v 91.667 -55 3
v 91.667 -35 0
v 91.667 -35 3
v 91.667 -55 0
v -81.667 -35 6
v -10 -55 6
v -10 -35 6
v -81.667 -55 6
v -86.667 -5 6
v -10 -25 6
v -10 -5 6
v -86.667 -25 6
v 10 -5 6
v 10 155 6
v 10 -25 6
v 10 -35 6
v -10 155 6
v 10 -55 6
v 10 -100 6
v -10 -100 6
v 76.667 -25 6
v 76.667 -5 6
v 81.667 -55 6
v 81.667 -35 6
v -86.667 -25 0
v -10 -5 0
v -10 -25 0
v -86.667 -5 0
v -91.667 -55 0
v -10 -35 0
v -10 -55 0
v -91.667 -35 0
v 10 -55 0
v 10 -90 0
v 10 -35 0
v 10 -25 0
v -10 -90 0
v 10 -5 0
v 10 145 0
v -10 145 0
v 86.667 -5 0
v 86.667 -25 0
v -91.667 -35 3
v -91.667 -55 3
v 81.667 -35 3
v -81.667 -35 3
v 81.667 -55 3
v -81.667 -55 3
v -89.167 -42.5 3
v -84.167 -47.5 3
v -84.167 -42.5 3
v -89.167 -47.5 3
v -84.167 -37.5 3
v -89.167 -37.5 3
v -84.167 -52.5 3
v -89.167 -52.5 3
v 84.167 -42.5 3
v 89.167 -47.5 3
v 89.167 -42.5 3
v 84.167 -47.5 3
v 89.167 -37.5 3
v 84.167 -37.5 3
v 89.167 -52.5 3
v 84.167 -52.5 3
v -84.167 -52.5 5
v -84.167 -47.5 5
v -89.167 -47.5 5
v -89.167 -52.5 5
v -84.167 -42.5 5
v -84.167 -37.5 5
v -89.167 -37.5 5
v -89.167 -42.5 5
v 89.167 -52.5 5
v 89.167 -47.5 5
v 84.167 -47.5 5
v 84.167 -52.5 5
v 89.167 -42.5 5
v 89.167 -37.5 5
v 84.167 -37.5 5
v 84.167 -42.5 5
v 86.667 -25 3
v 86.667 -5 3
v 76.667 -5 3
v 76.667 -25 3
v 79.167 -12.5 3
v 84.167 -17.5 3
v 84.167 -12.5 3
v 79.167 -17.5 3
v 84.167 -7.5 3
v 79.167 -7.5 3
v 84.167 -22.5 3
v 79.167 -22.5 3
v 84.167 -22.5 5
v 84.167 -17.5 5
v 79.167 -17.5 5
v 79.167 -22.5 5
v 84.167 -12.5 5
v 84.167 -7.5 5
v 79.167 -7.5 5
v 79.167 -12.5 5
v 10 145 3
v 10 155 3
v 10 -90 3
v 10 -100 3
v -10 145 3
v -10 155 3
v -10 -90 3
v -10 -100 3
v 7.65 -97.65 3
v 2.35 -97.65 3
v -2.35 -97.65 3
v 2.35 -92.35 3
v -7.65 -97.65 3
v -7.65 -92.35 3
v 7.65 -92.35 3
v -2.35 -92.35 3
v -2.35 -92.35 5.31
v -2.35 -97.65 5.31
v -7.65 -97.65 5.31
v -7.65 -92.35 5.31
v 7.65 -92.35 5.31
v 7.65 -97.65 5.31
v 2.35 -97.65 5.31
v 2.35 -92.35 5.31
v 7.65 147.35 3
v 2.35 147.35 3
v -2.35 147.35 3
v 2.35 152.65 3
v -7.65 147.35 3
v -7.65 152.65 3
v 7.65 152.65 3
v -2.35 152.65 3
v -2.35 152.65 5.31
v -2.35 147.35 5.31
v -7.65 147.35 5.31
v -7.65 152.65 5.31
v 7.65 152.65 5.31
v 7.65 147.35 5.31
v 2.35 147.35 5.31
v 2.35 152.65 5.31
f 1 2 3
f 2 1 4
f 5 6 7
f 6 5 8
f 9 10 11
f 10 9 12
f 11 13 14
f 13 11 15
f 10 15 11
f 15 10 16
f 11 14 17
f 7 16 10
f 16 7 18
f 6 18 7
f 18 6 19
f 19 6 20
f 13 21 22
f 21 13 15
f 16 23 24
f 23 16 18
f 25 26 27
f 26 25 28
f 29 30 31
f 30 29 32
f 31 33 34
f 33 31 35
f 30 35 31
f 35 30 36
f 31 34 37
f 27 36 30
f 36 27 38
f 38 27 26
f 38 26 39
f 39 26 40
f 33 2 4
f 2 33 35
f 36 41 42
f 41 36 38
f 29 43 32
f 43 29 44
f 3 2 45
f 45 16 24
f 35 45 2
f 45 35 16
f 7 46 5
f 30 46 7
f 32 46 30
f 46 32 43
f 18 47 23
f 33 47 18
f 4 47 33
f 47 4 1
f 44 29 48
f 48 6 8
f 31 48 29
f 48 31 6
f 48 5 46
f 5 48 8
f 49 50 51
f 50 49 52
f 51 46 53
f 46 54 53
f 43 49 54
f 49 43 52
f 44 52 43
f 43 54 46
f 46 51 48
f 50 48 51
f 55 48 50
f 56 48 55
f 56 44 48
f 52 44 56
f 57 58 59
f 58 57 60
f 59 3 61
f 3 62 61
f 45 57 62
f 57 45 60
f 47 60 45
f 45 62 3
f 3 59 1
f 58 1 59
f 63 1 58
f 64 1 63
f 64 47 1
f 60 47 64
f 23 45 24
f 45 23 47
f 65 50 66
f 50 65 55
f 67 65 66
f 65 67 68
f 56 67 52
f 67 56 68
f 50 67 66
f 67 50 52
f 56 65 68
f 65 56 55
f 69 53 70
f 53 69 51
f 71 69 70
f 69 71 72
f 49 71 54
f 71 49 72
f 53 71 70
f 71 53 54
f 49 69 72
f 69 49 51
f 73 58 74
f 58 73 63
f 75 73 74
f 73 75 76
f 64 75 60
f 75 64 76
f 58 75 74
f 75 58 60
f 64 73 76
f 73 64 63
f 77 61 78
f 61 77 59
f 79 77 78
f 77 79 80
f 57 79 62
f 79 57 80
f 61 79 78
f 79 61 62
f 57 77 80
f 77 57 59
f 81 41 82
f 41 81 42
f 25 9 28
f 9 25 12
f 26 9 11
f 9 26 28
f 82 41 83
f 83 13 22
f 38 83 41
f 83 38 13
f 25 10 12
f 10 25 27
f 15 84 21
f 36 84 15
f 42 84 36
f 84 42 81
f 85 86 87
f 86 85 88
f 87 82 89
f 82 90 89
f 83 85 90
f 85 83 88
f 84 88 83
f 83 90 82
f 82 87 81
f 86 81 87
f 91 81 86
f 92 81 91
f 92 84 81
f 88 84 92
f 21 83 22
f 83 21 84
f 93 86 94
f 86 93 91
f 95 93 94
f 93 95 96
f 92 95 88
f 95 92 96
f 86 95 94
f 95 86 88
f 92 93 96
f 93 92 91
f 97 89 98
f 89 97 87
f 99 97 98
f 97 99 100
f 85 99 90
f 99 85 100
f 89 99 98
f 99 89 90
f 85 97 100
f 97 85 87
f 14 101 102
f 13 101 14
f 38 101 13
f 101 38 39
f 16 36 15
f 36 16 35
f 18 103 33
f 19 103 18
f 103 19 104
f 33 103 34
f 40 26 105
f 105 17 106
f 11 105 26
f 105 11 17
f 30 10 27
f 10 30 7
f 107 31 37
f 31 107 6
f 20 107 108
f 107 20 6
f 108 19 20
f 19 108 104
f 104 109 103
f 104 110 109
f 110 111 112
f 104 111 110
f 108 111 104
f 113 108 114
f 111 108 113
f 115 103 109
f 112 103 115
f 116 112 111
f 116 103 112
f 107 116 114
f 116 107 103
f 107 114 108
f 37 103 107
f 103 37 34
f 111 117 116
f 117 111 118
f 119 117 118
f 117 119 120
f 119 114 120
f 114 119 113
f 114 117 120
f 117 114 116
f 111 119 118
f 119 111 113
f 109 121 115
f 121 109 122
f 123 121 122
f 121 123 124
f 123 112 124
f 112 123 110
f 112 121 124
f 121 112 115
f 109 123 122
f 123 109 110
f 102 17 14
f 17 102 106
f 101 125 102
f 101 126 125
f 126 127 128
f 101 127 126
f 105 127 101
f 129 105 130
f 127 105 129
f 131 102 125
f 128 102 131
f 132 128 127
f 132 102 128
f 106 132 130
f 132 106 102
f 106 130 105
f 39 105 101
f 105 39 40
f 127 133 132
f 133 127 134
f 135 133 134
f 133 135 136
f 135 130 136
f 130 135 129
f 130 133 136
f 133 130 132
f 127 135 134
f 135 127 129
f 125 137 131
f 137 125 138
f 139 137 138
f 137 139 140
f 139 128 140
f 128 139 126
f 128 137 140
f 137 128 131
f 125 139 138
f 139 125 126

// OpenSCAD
/**
 * Muntin Bar Generator — 3D Printed Door Grid
 * Parametric model for MakerWorld
 *
 * Companion calculator: https://emorin310.github.io/muntin-calculator/
 *
 * Pieces interlock at 4-way intersections via half-lap joints
 * with puzzle tabs for positive Z-locking.
 * H bars keep the bottom half at connectors (tabs protrude up).
 * V bars keep the top half at connectors (slots receive tabs).
 */

/* [Window] */
// Width of glass pane (mm)
pane_width = 530;
// Height of glass pane (mm)
pane_height = 1590;

/* [Bar] */
// Width of bars at intersections (mm)
bar_width = 20;
// Thickness of bars (mm)
bar_thickness = 6;

/* [Printer] */
// Maximum print bed length (mm)
max_bed = 250;

/* [Connector] */
// Puzzle tab width (mm)
tab_w = 5;
// Puzzle tab length along bar (mm)
tab_l = 5;
// Puzzle tab height / depth (mm)
tab_h = 2;
// Print clearance for slot fit (mm)
clearance = 0.3;

/* [Piece Selection] */
// Which piece to generate
piece = "all"; // [all:All Types, h_center:Horizontal Center, h_edge:Horizontal Edge, v_center:Vertical Center, v_edge:Vertical Edge]

/* [Hidden] */

// --- Auto-calculate minimum bars to fit print bed ---
max_flat = max_bed - bar_width;

v_bars = max(1, ceil((pane_width - max_flat) / (max_flat + bar_width)));
h_bars = max(1, ceil((pane_height - max_flat) / (max_flat + bar_width)));

// Flat lengths between intersections
h_flat = (pane_width - v_bars * bar_width) / (v_bars + 1);
v_flat = (pane_height - h_bars * bar_width) / (h_bars + 1);

// Piece total lengths
h_center_len = h_flat + bar_width;      // connector both ends
h_edge_len   = h_flat + bar_width / 2;  // connector one end
v_center_len = v_flat + bar_width;
v_edge_len   = v_flat + bar_width / 2;

// Piece counts
cols = v_bars + 1;
rows = h_bars + 1;
n_h_edge   = h_bars * 2;
n_h_center = h_bars * max(0, v_bars - 1);
n_v_edge   = v_bars * 2;
n_v_center = v_bars * max(0, h_bars - 1);
n_total    = n_h_edge + n_h_center + n_v_edge + n_v_center;

// Half dimensions
half = bar_thickness / 2;
hw   = bar_width / 2;
e    = 0.01;

// Slot dimensions (tab + clearance)
sl_w = tab_w + clearance;
sl_l = tab_l + clearance;
sl_h = tab_h + clearance;

// --- Console output ---
echo(str("Grid: ", cols, " x ", rows, " panes (",
         v_bars, " vertical x ", h_bars, " horizontal bars)"));
echo(str("h_flat = ", h_flat, " mm   v_flat = ", v_flat, " mm"));
echo(str("H center: ", h_center_len, " mm x ", n_h_center, " pcs"));
echo(str("H edge:   ", h_edge_len,   " mm x ", n_h_edge,   " pcs"));
echo(str("V center: ", v_center_len, " mm x ", n_v_center, " pcs"));
echo(str("V edge:   ", v_edge_len,   " mm x ", n_v_edge,   " pcs"));
echo(str("Total pieces: ", n_total));
echo(str("Verify W: ", cols, "x", h_flat, " + ", v_bars, "x", bar_width,
         " = ", cols * h_flat + v_bars * bar_width, " mm (expect ", pane_width, ")"));
echo(str("Verify H: ", rows, "x", v_flat, " + ", h_bars, "x", bar_width,
         " = ", rows * v_flat + h_bars * bar_width, " mm (expect ", pane_height, ")"));

// =====================================================
// Connector primitives
// =====================================================

// Tab: rectangular peg protruding UP from half-lap surface
// Place at (center_x, center_y, half) on H pieces
module tab() {
    translate([-tab_l/2, -tab_w/2, 0])
        cube([tab_l, tab_w, tab_h]);
}

// Slot: matching pocket cut INTO V piece from half-lap surface
// Place at (center_x, center_y, half) on V pieces
module slot() {
    translate([-sl_l/2, -sl_w/2, 0])
        cube([sl_l, sl_w, sl_h + e]);
}

// =====================================================
// Piece modules
// =====================================================

// Horizontal center: half-lap (bottom half) + tabs at both ends
module h_center() {
    // Center piece on origin
    translate([-h_center_len/2, -bar_width/2, 0])
    union() {
        difference() {
            cube([h_center_len, bar_width, bar_thickness]);
            // Left connector — remove top half
            translate([-e, -e, half])
                cube([hw + e, bar_width + 2*e, half + e]);
            // Right connector — remove top half
            translate([h_center_len - hw, -e, half])
                cube([hw + e, bar_width + 2*e, half + e]);
        }
        // Left connector tabs (one per crossing V bar)
        translate([hw/2, hw/2, half]) tab();
        translate([hw/2, bar_width - hw/2, half]) tab();
        // Right connector tabs
        translate([h_center_len - hw/2, hw/2, half]) tab();
        translate([h_center_len - hw/2, bar_width - hw/2, half]) tab();
    }
}

// Horizontal edge: half-lap + tabs at connector end only
module h_edge() {
    translate([-h_edge_len/2, -bar_width/2, 0])
    union() {
        difference() {
            cube([h_edge_len, bar_width, bar_thickness]);
            // Connector — remove top half
            translate([h_flat, -e, half])
                cube([hw + e, bar_width + 2*e, half + e]);
        }
        // Connector tabs
        translate([h_flat + hw/2, hw/2, half]) tab();
        translate([h_flat + hw/2, bar_width - hw/2, half]) tab();
    }
}

// Vertical center: half-lap (top half) + slots at both ends
module v_center() {
    translate([-bar_width/2, -v_center_len/2, 0])
    difference() {
        cube([bar_width, v_center_len, bar_thickness]);
        // Bottom connector — remove bottom half
        translate([-e, -e, -e])
            cube([bar_width + 2*e, hw + e, half + e]);
        // Top connector — remove bottom half
        translate([-e, v_center_len - hw, -e])
            cube([bar_width + 2*e, hw + e, half + e]);
        // Bottom connector slots (one per crossing H bar)
        translate([hw/2, hw/2, half]) slot();
        translate([bar_width - hw/2, hw/2, half]) slot();
        // Top connector slots
        translate([hw/2, v_center_len - hw/2, half]) slot();
        translate([bar_width - hw/2, v_center_len - hw/2, half]) slot();
    }
}

// Vertical edge: half-lap + slots at connector end only
module v_edge() {
    translate([-bar_width/2, -v_edge_len/2, 0])
    difference() {
        cube([bar_width, v_edge_len, bar_thickness]);
        // Connector — remove bottom half
        translate([-e, v_flat, -e])
            cube([bar_width + 2*e, hw + e, half + e]);
        // Connector slots
        translate([hw/2, v_flat + hw/2, half]) slot();
        translate([bar_width - hw/2, v_flat + hw/2, half]) slot();
    }
}

// =====================================================
// Layout — all pieces centered on build plate origin
// =====================================================
gap = 10;

if (piece == "all") {
    // Lay out all 4 types side by side, centered on origin
    total_y = 4 * bar_width + 3 * gap;
    offset_y = -total_y / 2 + bar_width / 2;

    translate([0, offset_y, 0])
        color("SaddleBrown") h_center();
    translate([0, offset_y + bar_width + gap, 0])
        color("Peru") h_edge();
    translate([0, offset_y + (bar_width + gap) * 2, 0])
        color("Sienna") v_center();
    translate([0, offset_y + (bar_width + gap) * 3, 0])
        color("Chocolate") v_edge();
} else if (piece == "h_center") {
    color("SaddleBrown") h_center();
} else if (piece == "h_edge") {
    color("Peru") h_edge();
} else if (piece == "v_center") {
    color("Sienna") v_center();
} else if (piece == "v_edge") {
    color("Chocolate") v_edge();
}
